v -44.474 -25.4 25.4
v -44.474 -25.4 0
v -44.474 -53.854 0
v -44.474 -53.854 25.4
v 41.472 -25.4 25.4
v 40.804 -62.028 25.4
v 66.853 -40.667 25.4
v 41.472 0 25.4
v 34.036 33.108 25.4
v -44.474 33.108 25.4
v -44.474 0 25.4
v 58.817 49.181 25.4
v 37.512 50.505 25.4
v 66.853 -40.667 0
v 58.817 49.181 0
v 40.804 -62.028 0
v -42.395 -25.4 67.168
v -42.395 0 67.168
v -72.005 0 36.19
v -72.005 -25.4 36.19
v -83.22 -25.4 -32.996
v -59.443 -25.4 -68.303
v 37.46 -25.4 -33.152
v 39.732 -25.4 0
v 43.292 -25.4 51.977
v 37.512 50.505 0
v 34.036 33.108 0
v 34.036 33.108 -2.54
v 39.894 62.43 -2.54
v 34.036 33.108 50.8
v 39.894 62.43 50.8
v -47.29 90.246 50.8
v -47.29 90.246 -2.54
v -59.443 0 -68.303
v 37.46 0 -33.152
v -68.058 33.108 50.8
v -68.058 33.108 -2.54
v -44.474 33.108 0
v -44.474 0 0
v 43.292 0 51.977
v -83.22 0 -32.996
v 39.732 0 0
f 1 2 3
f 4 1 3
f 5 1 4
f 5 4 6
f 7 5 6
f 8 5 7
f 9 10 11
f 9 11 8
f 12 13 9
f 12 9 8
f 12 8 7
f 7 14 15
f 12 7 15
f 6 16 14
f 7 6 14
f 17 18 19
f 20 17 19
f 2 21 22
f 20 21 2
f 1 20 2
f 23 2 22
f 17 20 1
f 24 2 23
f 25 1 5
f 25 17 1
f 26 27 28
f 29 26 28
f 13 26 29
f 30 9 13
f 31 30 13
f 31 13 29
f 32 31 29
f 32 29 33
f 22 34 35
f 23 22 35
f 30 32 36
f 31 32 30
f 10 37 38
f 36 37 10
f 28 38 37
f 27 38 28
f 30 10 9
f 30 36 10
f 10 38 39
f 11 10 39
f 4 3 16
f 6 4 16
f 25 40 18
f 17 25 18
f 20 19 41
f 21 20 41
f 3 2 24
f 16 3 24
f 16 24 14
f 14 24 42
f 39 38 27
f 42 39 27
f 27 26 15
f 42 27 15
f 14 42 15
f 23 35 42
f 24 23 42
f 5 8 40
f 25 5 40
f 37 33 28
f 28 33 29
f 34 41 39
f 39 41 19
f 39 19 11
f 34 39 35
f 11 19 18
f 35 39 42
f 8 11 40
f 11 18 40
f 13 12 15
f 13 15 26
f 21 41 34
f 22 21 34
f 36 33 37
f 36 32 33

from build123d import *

# Parameters (mm, degrees)
F1_DEPTH      = 25.4
F3_DEPTH      = 25.4
F5_DEPTH      = 25.4
F5_DEPTH_BACK = 27.94


with BuildPart() as f1:
    # F0 (on Front) → F1 (new body)
    with BuildSketch(Plane.XZ):
        Polygon((43.29247, 51.976606), (-42.395219, 67.168467), (-72.004579, 36.189649), (-83.220236, -32.996144), (-59.443031, -68.303168), (37.460331, -33.151548), align=None)
    extrude(amount=F1_DEPTH)

    # F2 (on Top) → F3 (join)
    with BuildSketch(Plane.XY):
        Polygon((58.817156, 49.181223), (-44.473868, 55.597309), (-44.473868, -53.853892), (40.803842, -62.028117), (66.853315, -40.667363), align=None)
    extrude(amount=F3_DEPTH)

    # F4 (on face) → F5 (join, two sides)
    with BuildSketch(Plane.XY.offset(25.4)) as f5_sk:
        Polygon((-68.057574, 33.107851), (34.036424, 33.107851), (39.893586, 62.429648), (-47.290079, 90.245612), align=None)
    extrude(amount=F5_DEPTH)
    extrude(f5_sk.sketch, amount=-F5_DEPTH_BACK)


solid = f1.part
